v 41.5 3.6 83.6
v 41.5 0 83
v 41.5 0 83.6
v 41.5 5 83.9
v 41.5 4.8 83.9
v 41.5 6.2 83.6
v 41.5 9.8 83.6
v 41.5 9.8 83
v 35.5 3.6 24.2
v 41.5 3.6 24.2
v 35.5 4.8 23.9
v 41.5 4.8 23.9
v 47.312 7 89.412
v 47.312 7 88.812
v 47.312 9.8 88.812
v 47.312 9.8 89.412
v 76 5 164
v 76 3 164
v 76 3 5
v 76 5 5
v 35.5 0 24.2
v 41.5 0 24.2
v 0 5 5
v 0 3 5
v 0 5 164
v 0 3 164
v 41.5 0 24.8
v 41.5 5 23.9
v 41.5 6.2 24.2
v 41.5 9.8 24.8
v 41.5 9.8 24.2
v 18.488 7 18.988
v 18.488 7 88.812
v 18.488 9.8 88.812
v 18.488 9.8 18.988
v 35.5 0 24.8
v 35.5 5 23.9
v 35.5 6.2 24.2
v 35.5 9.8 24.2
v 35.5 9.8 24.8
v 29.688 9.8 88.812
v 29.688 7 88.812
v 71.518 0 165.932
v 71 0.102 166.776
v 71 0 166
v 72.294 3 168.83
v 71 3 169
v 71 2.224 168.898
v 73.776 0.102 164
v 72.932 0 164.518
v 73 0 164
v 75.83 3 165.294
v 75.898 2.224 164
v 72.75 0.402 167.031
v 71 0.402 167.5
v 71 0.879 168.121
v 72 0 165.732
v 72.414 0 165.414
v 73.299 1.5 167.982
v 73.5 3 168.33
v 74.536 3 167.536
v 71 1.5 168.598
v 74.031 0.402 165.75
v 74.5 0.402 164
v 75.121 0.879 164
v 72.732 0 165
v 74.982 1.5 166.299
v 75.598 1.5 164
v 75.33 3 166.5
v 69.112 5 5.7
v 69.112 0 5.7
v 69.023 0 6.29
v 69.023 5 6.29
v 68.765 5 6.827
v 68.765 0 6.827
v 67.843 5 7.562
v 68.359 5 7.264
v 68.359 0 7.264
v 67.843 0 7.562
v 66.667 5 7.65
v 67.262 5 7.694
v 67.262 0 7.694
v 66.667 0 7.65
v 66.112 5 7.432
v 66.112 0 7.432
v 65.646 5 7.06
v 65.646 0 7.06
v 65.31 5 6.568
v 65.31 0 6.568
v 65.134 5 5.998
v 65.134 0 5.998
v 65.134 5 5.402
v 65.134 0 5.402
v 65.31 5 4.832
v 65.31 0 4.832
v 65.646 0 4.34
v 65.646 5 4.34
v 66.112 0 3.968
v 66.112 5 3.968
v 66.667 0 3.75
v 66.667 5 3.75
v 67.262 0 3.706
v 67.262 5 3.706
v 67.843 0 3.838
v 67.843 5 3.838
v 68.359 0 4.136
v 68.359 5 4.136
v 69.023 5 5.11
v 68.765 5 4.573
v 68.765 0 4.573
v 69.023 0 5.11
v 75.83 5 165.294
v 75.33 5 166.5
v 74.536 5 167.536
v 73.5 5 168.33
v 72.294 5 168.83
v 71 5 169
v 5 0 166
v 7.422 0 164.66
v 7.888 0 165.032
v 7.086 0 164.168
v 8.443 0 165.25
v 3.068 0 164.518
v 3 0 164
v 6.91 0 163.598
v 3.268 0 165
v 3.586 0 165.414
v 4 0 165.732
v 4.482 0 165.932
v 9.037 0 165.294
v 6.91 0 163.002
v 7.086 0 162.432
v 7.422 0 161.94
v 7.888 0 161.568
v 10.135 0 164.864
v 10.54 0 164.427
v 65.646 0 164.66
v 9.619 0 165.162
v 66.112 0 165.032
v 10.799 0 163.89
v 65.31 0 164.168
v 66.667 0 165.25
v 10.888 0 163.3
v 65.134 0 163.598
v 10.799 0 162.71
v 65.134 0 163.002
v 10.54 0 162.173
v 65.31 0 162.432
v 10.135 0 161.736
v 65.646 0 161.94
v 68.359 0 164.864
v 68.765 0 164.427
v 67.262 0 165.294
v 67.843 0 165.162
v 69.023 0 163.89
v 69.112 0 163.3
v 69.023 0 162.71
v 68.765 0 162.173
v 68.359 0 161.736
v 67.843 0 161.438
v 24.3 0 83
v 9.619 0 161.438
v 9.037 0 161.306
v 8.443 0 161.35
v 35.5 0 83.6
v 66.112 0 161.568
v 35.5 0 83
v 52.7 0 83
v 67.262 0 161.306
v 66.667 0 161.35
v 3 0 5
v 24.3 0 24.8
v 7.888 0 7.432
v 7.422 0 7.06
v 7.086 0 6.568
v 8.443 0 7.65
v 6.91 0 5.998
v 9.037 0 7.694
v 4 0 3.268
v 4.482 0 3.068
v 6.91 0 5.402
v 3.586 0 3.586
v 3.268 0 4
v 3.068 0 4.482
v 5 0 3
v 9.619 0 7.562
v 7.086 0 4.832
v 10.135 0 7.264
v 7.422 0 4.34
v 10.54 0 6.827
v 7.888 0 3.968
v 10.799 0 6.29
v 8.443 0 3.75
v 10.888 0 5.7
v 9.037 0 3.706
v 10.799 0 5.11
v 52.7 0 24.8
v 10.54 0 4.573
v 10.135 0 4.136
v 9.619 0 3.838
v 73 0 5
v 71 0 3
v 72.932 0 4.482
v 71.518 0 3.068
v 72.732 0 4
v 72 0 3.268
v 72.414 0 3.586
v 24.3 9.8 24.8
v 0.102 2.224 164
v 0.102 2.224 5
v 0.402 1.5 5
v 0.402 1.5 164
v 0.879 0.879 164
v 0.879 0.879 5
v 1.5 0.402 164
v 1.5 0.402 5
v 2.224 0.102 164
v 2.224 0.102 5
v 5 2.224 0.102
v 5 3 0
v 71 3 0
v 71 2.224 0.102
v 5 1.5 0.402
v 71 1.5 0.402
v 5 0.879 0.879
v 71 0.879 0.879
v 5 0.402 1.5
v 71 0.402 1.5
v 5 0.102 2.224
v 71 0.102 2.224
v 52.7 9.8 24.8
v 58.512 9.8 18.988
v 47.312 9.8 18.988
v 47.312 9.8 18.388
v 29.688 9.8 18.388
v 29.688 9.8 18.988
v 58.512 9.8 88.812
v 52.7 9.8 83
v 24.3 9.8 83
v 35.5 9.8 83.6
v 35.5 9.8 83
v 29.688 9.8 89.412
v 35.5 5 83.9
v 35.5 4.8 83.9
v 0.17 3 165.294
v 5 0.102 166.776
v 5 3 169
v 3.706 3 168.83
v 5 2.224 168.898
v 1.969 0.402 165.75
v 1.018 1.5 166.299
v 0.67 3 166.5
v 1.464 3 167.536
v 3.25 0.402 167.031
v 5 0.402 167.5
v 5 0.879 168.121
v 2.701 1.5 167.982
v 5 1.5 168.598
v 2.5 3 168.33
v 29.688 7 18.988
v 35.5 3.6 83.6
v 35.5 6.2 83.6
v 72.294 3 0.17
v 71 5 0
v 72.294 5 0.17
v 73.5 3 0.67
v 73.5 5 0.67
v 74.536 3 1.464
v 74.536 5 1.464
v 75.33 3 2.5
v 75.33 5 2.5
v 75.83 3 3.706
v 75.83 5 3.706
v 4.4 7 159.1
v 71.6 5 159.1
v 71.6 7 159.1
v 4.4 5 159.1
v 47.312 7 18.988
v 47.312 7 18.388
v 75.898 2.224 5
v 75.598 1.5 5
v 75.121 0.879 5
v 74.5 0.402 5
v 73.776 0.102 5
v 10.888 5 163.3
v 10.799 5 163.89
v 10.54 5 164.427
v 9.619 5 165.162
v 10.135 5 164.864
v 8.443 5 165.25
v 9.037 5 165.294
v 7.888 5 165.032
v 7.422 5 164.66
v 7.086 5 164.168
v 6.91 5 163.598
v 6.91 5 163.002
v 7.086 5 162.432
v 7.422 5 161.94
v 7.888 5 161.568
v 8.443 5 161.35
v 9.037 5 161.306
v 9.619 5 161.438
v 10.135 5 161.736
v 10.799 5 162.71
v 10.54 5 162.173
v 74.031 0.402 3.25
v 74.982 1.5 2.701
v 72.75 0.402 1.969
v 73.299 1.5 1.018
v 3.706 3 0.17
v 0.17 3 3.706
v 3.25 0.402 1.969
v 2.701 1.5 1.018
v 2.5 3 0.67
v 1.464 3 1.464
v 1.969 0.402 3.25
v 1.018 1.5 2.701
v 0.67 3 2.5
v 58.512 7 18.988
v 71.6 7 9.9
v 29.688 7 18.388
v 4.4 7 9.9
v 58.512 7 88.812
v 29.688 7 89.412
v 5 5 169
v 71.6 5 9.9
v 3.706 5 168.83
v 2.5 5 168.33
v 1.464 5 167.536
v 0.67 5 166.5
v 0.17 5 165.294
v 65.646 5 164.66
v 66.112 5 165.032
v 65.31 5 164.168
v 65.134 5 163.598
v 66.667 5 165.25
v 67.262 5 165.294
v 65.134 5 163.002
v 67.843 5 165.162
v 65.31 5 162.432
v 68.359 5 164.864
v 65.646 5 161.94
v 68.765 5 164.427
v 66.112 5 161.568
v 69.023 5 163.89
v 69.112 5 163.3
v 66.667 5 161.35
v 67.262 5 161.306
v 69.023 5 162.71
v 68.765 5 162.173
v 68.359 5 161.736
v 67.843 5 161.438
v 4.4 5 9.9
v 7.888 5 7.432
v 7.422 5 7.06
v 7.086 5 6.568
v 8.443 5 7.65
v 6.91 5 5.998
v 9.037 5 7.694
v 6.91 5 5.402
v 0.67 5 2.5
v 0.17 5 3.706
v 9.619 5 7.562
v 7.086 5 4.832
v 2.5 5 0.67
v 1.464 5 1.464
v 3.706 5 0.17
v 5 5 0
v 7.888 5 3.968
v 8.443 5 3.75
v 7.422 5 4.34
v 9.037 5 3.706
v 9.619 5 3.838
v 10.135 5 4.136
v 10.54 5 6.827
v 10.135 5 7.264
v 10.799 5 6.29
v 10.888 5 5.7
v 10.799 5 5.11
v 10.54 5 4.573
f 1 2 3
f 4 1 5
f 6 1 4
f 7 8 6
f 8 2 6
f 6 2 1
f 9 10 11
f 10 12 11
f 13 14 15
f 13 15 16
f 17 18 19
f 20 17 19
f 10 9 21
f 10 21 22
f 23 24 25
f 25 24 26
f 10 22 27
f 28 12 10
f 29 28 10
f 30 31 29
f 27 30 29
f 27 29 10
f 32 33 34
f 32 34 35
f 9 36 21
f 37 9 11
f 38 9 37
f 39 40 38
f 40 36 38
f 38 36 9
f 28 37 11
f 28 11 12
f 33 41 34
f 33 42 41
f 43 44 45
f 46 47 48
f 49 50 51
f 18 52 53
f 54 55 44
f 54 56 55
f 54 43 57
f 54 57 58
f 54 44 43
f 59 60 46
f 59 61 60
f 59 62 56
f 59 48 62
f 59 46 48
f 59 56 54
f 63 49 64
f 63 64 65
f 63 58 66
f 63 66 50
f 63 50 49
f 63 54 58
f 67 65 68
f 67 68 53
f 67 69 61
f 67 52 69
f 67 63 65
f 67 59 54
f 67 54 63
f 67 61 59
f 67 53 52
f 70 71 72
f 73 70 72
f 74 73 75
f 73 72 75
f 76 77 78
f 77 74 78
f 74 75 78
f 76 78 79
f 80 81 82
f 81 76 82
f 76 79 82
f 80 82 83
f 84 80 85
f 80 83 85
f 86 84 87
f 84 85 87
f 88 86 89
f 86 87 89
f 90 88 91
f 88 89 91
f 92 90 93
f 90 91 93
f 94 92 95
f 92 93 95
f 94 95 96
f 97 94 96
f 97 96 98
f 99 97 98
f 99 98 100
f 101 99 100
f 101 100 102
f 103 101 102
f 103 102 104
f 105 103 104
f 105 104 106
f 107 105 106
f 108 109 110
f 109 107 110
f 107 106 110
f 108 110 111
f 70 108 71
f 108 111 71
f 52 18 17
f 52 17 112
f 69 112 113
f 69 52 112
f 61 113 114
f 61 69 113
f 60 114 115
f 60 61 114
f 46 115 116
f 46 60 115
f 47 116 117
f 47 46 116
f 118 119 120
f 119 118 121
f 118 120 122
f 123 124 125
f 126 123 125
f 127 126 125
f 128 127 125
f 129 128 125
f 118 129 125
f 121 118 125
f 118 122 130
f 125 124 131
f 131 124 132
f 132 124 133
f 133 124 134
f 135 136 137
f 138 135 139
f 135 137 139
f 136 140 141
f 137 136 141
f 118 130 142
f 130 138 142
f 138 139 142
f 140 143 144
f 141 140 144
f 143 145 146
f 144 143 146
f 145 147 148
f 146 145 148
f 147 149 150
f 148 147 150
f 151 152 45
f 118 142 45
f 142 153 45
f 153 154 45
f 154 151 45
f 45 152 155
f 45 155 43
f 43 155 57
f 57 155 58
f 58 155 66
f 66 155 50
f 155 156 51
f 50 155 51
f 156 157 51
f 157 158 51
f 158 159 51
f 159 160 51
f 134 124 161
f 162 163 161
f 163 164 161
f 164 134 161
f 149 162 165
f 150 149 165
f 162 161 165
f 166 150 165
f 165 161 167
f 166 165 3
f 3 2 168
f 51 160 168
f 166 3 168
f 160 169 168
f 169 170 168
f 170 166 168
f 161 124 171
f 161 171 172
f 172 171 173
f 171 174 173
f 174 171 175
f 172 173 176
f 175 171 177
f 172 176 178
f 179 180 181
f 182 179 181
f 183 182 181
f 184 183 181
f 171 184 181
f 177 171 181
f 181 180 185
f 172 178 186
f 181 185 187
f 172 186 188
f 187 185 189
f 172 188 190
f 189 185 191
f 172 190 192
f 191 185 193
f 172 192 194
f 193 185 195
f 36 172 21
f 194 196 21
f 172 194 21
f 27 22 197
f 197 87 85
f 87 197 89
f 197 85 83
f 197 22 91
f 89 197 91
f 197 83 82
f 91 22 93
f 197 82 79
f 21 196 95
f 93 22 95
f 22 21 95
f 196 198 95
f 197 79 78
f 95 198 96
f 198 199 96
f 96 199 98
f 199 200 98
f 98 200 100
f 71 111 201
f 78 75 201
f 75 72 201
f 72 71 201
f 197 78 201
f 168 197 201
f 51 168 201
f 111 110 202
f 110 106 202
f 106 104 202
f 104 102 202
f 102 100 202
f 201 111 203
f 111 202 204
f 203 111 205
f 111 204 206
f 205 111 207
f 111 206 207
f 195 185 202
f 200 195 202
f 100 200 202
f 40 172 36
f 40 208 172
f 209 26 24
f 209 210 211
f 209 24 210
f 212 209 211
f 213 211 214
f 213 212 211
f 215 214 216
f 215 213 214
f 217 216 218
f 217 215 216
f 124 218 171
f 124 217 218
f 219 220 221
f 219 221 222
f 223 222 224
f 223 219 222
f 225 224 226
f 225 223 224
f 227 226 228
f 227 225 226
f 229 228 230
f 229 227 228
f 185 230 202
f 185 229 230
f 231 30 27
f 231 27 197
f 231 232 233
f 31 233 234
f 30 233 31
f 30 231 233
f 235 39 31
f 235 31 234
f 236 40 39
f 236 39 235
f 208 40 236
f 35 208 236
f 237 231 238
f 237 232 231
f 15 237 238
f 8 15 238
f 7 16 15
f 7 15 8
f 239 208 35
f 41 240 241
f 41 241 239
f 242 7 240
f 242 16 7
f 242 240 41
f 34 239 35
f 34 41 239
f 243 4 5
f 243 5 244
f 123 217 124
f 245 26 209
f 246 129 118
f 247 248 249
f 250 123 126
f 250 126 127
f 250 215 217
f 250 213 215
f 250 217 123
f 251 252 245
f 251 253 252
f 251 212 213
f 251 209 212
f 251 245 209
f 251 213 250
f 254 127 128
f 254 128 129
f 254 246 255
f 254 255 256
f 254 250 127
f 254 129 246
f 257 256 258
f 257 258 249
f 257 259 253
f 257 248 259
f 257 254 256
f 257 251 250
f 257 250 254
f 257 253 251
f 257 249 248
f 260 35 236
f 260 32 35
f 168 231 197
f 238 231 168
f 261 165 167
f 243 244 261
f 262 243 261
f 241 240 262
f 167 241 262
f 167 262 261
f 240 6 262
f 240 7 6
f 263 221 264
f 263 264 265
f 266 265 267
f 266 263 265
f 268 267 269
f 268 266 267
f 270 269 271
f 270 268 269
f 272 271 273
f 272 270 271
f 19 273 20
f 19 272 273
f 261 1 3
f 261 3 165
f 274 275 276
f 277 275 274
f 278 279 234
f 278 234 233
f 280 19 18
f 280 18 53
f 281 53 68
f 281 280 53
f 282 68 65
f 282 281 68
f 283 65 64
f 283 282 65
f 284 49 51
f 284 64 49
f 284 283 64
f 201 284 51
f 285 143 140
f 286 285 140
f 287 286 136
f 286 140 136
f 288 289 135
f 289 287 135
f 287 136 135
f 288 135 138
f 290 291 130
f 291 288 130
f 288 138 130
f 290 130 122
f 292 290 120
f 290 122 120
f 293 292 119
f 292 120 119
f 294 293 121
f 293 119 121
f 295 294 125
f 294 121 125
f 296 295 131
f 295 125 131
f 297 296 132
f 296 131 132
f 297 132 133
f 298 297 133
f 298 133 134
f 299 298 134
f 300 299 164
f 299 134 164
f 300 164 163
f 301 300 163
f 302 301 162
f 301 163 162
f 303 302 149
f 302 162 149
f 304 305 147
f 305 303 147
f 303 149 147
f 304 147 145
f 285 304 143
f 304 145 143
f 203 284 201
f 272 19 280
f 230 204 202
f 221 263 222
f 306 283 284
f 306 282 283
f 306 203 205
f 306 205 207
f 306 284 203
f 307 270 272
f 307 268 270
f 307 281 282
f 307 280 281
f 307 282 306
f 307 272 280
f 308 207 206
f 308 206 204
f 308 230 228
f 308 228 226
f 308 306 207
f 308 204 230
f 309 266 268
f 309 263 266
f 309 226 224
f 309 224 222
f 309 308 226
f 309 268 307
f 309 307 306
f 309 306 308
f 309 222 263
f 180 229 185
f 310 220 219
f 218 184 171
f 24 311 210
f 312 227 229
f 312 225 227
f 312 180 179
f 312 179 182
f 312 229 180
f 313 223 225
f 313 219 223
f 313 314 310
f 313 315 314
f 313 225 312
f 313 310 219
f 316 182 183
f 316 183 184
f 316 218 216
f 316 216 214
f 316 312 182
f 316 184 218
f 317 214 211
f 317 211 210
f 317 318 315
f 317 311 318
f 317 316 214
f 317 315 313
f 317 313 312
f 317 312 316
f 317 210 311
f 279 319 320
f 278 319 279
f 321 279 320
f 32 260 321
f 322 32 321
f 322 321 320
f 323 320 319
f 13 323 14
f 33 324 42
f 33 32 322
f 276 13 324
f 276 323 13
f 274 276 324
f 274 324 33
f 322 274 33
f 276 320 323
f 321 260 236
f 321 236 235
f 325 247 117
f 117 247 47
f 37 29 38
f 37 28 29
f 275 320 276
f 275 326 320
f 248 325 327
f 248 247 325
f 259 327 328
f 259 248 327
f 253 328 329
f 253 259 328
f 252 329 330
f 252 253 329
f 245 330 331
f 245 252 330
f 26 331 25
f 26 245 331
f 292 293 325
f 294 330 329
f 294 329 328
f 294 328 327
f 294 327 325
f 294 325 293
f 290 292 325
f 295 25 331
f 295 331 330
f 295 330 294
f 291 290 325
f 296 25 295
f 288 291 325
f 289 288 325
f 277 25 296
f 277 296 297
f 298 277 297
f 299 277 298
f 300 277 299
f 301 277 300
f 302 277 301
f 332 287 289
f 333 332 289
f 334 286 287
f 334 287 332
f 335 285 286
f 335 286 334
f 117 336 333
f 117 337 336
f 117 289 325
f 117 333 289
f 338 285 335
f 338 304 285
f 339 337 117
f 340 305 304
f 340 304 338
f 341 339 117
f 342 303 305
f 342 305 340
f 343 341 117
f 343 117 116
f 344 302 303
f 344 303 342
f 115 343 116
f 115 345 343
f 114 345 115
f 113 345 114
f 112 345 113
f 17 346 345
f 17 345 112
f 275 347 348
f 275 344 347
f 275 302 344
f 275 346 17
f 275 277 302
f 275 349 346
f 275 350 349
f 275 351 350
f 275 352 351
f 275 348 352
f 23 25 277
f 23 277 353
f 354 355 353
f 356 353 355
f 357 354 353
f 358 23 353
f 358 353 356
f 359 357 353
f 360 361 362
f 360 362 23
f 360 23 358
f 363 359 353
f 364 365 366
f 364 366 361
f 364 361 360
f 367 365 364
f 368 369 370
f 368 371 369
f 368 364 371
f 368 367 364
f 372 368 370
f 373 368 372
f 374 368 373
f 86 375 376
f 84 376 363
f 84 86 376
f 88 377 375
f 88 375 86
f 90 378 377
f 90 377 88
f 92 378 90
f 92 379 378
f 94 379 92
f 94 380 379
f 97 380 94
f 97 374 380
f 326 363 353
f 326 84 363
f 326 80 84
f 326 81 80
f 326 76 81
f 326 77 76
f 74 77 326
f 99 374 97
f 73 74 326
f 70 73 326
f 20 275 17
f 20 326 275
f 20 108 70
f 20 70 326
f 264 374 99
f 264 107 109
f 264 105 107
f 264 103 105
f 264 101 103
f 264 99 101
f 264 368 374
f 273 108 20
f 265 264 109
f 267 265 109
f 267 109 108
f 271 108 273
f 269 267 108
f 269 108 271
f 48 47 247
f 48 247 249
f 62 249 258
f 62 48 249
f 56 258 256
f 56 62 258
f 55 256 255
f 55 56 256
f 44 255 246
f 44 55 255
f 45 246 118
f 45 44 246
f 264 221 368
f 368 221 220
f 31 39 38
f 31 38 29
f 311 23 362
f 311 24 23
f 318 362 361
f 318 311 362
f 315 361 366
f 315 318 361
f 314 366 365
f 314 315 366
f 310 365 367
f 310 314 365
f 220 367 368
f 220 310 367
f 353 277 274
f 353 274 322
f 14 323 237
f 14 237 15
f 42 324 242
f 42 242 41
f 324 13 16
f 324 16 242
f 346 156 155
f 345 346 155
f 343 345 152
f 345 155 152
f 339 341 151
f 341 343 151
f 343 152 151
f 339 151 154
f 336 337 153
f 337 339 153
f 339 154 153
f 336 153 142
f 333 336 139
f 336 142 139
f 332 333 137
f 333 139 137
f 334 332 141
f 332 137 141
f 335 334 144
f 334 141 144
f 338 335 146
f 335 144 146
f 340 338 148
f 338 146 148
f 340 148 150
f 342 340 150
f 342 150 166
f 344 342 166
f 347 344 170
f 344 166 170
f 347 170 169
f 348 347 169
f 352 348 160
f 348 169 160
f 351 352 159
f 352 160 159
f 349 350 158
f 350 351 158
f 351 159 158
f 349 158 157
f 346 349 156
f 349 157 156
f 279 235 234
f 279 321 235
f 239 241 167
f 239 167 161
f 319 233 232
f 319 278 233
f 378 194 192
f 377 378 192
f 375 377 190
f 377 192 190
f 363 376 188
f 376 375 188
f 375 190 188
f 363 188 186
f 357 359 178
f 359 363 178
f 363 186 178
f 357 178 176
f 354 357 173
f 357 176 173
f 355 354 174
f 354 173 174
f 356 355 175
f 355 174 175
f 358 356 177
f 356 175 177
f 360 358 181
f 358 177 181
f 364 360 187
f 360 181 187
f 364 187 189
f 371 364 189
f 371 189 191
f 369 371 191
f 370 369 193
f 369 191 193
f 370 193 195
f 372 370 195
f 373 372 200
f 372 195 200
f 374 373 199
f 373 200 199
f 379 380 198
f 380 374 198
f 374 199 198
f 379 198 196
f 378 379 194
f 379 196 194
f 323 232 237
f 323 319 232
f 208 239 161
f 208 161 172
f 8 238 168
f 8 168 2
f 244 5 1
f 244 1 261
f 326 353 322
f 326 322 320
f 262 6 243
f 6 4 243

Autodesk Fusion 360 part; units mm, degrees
sketch "Esboço1" plane through (0, 0, 0) normal (0, 1, 0) x (1, 0, 0)
  line L0 (0, -5) -> (0, -164)
  arc A0 (71, -169) -> (76, -164) centre (71, -164) ccw
  circle A1 centre (67.1121, -163.3) radius 2
  arc A2 (76, -5) -> (71, 0) centre (71, -5) ccw
  line L1 (4, -9.5) -> (72, -9.5)
  circle A3 centre (67.1121, -5.7) radius 2
  arc A4 (5, 0) -> (0, -5) centre (5, -5) ccw
  line L2 (72, -9.5) -> (72, -159.5)
  circle A5 centre (8.8879, -163.3) radius 2
  line L3 (72, -159.5) -> (4, -159.5)
  arc A6 (0, -164) -> (5, -169) centre (5, -164) ccw
  line L4 (76, -164) -> (76, -5)
  circle A7 centre (8.8879, -5.7) radius 2
  line L5 (71, 0) -> (5, 0)
  line L6 (4, -159.5) -> (4, -9.5)
  line L7 (5, -169) -> (71, -169)
extrude "Extrusão1" add sketch "Esboço1" along normal blind 5 contours L0 A0 A2 A4 A6 L4 L5 L7 | L1 L2 L3 L6
sketch "Esboço3" plane through (0, 5, 0) normal (0, 1, 0) x (-1, 0, 0)
  circle A0 centre (-8.8879, 163.3) radius 2
  circle A1 centre (-67.1121, 5.7) radius 2
  circle A2 centre (-67.1121, 163.3) radius 2
  circle A3 centre (-8.8879, 5.7) radius 2
  line L0 (-5, 169) -> (-71, 169)
  arc A4 (-71, 169) -> (-76, 164) centre (-71, 164) ccw
  line L1 (-76, 164) -> (-76, 5)
  arc A5 (-76, 5) -> (-71, 0) centre (-71, 5) ccw
  line L2 (-71, 0) -> (-5, 0)
  arc A6 (-5, 0) -> (0, 5) centre (-5, 5) ccw
  line L3 (0, 5) -> (0, 164)
  arc A7 (0, 164) -> (-5, 169) centre (-5, 164) ccw
  line L4 (-76, 164) -> (-76, 5)
  arc A8 (-5, 0) -> (0, 5) centre (-5, 5) ccw
  circle A9 centre (-8.8879, 5.7) radius 2
  arc A10 (0, 164) -> (-5, 169) centre (-5, 164) ccw
  line L5 (-72, 159.5) -> (-4, 159.5)
  circle A11 centre (-8.8879, 163.3) radius 2
  arc A12 (-71, 169) -> (-76, 164) centre (-71, 164) ccw
  line L6 (-4, 159.5) -> (-4, 9.5)
  circle A13 centre (-67.1121, 5.7) radius 2
  line L7 (-4, 9.5) -> (-72, 9.5)
  arc A14 (-76, 5) -> (-71, 0) centre (-71, 5) ccw
  line L8 (0, 5) -> (0, 164)
  circle A15 centre (-67.1121, 163.3) radius 2
  line L9 (-5, 169) -> (-71, 169)
  line L10 (-72, 9.5) -> (-72, 159.5)
  line L11 (-71, 0) -> (-5, 0)
  line L12 (-71.6, 159.1) -> (-4.4, 159.1)
  line L13 (-4.4, 159.1) -> (-4.4, 9.9)
  line L14 (-4.4, 9.9) -> (-71.6, 9.9)
  line L15 (-71.6, 9.9) -> (-71.6, 159.1)
  point P0 (-76, 169)
  dimension "d3" = 0.4
extrude "Extrusão2" add sketch "Esboço3" along normal blind 2 contours L12 L13 L14 L15
sketch "Esboço4" plane through (0, 7, 0) normal (0, 1, 0) x (-1, 0, 0)
  line L0 (-71.6, 9.9) -> (-4.4, 9.9)
  line L1 (-4.4, 9.9) -> (-4.4, 159.1)
  line L2 (-4.4, 159.1) -> (-71.6, 159.1)
  line L3 (-71.6, 159.1) -> (-71.6, 9.9)
  line L4 (-52.7, 24.8) -> (-52.7, 83)
  line L5 (-35.5, 24.2) -> (-41.5, 24.2)
  line L6 (-24.3, 24.8) -> (-35.5, 24.8)
  line L7 (-41.5, 24.2) -> (-41.5, 24.8)
  line L8 (-24.3, 83) -> (-24.3, 24.8)
  line L9 (-52.7, 83) -> (-41.5, 83)
  line L10 (-41.5, 24.8) -> (-52.7, 24.8)
  line L11 (-41.5, 83.6) -> (-35.5, 83.6)
  line L12 (-35.5, 83.6) -> (-35.5, 83)
  line L13 (-35.5, 83) -> (-24.3, 83)
  line L14 (-41.5, 83) -> (-41.5, 83.6)
  line L15 (-35.5, 24.8) -> (-35.5, 24.2)
  line L16 (-29.6883, 89.4117) -> (-29.6883, 88.8117)
  line L17 (-29.6883, 88.8117) -> (-18.4883, 88.8117)
  line L18 (-18.4883, 88.8117) -> (-18.4883, 18.9883)
  line L19 (-18.4883, 18.9883) -> (-29.6883, 18.9883)
  line L20 (-29.6883, 18.9883) -> (-29.6883, 18.3883)
  line L21 (-29.6883, 18.3883) -> (-47.3117, 18.3883)
  line L22 (-47.3117, 18.3883) -> (-47.3117, 18.9883)
  line L23 (-47.3117, 18.9883) -> (-58.5117, 18.9883)
  line L24 (-58.5117, 18.9883) -> (-58.5117, 88.8117)
  line L25 (-58.5117, 88.8117) -> (-47.3117, 88.8117)
  line L26 (-47.3117, 88.8117) -> (-47.3117, 89.4117)
  line L27 (-47.3117, 89.4117) -> (-29.6883, 89.4117)
  dimension "d6" = -5.8117
extrude "Extrusão3" add sketch "Esboço4" along normal blind 2.8 contours L16 L17 L18 L19 L20 L21 L22 L23 L24 L25 L26 L27
extrude "Extrusão4" cut 1 faces at (48.9667, 7, 44.2) along direction (0, -1, 0) blind 14
sketch "Esboço5" plane through (0, 0, 83.6) normal (0, 0, -1) x (-1, 0, 0)
  line L0 (-35.5, 0) -> (-35.5, 9.8)
  line L1 (-35.5, 9.8) -> (-41.5, 9.8)
  line L2 (-41.5, 9.8) -> (-41.5, 0)
  line L3 (-41.5, 0) -> (-35.5, 0)
  line L4 (-35.5, 4.9) -> (-36, 4.9)
  line L5 (-36, 4.9) -> (-41.5, 4.9)
  line L6 (-35.5, 5) -> (-36, 5)
  line L7 (-36, 5) -> (-41.5, 5)
  line L8 (-35.5, 4.8) -> (-36, 4.8)
  line L9 (-36, 4.8) -> (-41.5, 4.8)
  dimension "d11" = 0.1
  dimension "d12" = -0.1
extrude "Extrusão5" cut sketch "Esboço5" against normal blind 0.3 contours L0 L2 L4 L5 L8 L9 | L0 L2 L4 L5 L6 L7
chamfer "Chanfro1" distance 1.2 distance2 0.3 1 edges at (38.5, 5, 83.6) measured on face at (39.5, 8.2, 83.6)
chamfer "Chanfro2" distance 1.2 distance2 0.3 1 edges at (38.5, 4.8, 83.6) measured on face at (39.5, 3.2, 83.6)
sketch "Esboço6" plane through (0, 0, 24.2) normal (0, 0, 1) x (1, 0, 0)
  line L0 (41.5, 0) -> (41.5, 9.8)
  line L1 (41.5, 9.8) -> (35.5, 9.8)
  line L2 (35.5, 9.8) -> (35.5, 0)
  line L3 (35.5, 0) -> (41.5, 0)
  line L4 (35.5, 4.9) -> (41.5, 4.9)
  line L5 (35.5, 4.8) -> (41.5, 4.8)
  line L6 (35.5, 5) -> (41.5, 5)
  dimension "d19" = 0.1
  dimension "d20" = -0.1
extrude "Extrusão6" cut sketch "Esboço6" against normal blind 0.3 contours L0 L2 L4 L5 | L0 L2 L4 L6
chamfer "Chanfro3" distance 1.2 distance2 0.3 1 edges at (38.5, 5, 24.2) measured on face at (37.5, 8.2, 24.2)
chamfer "Chanfro4" distance 1.2 distance2 0.3 1 edges at (38.5, 4.8, 24.2) measured on face at (37.5, 3.2, 24.2)
fillet "Arredondamento1" radius 3 8 edges at (0, 0, 84.5) (1.4645, 0, 167.5355) (38, 0, 169) (74.5355, 0, 167.5355) (76, 0, 84.5) (74.5355, 0, 1.4645) (38, 0, 0) (1.4645, 0, 1.4645)
